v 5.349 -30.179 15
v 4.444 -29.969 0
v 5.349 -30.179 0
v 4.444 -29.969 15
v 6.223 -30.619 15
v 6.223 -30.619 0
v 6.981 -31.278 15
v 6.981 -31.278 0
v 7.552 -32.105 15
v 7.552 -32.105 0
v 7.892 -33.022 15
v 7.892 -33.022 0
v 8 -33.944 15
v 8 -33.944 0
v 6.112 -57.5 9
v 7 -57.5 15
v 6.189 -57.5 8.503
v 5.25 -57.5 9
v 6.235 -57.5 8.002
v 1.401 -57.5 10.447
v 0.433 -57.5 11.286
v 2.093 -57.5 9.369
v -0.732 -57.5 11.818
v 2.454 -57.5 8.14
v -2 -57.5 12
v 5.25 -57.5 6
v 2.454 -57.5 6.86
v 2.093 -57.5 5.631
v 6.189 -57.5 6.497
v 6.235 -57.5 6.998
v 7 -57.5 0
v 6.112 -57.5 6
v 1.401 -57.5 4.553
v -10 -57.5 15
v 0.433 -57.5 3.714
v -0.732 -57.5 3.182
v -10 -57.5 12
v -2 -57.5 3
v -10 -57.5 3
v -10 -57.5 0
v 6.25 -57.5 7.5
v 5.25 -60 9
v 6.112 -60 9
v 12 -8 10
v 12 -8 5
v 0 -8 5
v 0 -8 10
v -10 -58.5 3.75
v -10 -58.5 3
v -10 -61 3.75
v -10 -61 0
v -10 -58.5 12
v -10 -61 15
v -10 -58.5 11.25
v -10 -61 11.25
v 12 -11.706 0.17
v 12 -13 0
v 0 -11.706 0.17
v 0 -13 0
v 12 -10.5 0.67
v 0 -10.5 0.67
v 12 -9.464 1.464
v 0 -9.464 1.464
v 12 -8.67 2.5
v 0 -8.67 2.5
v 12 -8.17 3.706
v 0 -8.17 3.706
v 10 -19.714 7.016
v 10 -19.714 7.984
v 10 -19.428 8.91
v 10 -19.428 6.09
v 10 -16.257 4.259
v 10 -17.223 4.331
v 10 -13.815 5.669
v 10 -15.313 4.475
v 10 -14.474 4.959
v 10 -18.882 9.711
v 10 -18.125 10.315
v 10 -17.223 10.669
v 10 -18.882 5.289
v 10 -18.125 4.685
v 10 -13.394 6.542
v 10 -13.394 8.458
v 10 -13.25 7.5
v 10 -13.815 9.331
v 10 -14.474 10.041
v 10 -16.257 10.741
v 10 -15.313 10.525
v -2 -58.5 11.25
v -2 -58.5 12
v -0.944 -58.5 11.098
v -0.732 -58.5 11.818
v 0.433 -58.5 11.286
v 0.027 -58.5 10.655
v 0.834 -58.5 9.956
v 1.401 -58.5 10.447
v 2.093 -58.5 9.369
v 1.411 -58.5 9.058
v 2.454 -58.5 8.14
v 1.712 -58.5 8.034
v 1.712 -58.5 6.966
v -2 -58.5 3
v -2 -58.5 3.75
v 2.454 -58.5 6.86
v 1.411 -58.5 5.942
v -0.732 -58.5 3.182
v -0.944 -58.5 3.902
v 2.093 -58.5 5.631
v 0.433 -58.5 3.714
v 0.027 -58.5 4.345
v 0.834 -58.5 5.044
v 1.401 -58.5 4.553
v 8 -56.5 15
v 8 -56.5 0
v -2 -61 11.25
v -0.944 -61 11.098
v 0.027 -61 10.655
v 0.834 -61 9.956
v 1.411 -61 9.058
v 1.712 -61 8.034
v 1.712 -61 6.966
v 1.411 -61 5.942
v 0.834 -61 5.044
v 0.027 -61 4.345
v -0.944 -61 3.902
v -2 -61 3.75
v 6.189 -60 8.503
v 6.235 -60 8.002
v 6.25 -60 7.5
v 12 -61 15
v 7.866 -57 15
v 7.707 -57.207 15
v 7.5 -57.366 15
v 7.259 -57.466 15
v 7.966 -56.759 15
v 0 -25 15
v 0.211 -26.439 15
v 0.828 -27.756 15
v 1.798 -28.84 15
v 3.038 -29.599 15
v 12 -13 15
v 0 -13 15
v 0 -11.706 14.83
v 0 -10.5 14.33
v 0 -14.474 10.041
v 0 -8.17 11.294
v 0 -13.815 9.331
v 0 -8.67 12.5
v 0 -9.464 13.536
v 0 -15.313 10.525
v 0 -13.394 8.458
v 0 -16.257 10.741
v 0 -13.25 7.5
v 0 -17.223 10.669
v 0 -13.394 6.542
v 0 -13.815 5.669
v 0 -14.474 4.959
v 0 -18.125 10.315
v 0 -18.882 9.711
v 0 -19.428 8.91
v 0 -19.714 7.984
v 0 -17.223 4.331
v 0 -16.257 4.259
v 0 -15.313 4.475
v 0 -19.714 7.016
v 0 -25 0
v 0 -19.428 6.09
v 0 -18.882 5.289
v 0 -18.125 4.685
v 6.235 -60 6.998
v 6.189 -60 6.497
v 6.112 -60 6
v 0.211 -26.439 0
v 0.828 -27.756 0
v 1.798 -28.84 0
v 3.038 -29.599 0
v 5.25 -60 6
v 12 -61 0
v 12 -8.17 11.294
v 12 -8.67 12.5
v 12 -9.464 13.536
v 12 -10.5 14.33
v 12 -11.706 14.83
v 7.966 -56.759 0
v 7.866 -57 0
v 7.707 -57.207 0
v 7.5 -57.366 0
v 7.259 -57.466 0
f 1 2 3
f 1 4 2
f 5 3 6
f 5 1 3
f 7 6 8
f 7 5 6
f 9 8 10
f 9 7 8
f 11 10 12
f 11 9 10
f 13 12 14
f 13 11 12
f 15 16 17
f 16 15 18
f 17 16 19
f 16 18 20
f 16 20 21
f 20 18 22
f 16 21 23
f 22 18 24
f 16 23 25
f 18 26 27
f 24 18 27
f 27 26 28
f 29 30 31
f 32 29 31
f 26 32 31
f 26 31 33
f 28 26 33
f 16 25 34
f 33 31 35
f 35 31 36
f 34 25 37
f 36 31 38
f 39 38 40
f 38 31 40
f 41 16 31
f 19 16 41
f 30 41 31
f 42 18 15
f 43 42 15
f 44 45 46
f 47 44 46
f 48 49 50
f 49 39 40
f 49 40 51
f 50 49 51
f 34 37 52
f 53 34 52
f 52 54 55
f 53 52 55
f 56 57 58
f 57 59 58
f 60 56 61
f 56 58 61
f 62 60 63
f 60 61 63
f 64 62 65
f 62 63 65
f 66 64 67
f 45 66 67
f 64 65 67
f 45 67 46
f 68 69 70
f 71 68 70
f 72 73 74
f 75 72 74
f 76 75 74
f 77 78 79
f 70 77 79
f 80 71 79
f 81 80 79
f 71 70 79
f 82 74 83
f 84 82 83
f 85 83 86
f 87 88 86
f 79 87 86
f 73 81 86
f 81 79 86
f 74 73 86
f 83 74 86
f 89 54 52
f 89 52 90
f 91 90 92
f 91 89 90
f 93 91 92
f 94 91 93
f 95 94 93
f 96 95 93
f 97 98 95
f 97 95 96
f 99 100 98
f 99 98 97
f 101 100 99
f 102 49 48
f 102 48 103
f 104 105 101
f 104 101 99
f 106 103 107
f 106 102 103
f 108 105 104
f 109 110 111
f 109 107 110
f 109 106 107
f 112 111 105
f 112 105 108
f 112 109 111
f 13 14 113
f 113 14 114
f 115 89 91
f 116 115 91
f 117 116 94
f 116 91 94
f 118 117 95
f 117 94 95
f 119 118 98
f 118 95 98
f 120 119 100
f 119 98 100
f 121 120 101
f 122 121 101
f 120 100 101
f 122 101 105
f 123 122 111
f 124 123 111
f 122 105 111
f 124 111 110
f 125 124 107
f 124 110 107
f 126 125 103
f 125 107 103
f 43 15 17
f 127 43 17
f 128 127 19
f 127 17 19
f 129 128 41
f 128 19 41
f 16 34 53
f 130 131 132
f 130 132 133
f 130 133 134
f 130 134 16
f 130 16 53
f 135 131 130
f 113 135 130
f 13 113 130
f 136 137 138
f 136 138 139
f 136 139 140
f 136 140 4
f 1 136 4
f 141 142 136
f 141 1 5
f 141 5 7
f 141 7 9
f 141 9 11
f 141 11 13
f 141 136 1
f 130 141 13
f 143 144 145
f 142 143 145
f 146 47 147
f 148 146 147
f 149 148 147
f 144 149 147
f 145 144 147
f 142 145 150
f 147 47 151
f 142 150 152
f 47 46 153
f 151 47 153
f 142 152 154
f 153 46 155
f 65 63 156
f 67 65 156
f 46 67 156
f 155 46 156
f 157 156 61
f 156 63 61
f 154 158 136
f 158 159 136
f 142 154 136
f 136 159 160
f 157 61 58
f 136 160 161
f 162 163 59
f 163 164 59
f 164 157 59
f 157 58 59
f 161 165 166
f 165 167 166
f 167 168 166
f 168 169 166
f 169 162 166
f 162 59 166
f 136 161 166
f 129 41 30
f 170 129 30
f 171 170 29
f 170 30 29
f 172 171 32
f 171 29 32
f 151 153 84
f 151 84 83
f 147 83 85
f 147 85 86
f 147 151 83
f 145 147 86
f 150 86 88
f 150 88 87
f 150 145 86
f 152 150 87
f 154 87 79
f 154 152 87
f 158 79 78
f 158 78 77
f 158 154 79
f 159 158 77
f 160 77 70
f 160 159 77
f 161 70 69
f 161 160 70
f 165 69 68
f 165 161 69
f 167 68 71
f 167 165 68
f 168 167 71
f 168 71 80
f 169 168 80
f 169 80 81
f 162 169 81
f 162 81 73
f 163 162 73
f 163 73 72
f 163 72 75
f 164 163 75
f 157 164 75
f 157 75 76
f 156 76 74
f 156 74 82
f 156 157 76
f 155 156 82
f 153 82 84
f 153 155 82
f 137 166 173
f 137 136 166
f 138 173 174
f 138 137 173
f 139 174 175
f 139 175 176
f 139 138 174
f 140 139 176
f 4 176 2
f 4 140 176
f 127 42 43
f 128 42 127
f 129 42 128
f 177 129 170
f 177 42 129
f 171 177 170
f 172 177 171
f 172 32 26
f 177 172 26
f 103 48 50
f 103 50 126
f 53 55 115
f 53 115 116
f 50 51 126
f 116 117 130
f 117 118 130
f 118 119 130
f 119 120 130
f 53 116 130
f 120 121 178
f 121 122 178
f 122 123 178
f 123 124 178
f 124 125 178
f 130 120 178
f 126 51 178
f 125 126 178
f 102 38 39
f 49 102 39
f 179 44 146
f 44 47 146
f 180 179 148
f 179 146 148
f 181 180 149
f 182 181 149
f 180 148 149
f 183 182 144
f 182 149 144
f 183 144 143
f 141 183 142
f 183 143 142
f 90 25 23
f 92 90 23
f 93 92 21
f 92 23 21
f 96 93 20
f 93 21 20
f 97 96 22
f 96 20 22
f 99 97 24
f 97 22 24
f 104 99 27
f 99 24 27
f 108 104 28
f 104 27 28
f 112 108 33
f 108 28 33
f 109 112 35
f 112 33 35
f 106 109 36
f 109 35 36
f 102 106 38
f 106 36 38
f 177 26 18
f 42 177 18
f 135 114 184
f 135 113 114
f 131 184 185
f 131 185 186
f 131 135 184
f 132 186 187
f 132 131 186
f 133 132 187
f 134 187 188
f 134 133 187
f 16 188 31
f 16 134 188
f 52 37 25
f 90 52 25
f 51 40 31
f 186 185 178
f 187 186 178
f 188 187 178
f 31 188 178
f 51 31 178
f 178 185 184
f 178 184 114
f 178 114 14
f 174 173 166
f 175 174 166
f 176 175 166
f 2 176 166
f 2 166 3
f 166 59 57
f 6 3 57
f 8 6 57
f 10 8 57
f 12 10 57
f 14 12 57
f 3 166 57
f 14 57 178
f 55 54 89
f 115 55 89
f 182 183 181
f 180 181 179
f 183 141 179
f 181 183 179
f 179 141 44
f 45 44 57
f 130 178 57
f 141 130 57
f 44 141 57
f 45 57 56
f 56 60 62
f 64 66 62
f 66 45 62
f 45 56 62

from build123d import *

# Parameters (mm, degrees)
BOSS_EXTRUDE1_DEPTH    = 15
CUT_EXTRUDE1_OUTLINE_R = 3.25
CUT_EXTRUDE1_DEPTH     = 10
CUT_EXTRUDE2_DEPTH     = 1
CUT_EXTRUDE3_REACH     = 56.03
SKETCH5_W              = 8
SKETCH5_H              = 7.5
CUT_EXTRUDE4_DEPTH     = 2.5
FILLET1_R              = 5
FILLET2_R              = 4
FILLET4_R              = 5
FILLET5_R              = 1


# Read off the part's stored shape, not the designer's step: Cut-Extrude1
with BuildPart() as part:
    # Sketch1 → Boss-Extrude1 (new body)
    with BuildSketch(Plane.XY):
        Polygon((0, -8), (0, -30), (8, -30), (8, -57.5), (-10, -57.5), (-10, -61), (12, -61), (12, -8), align=None)
    extrude(amount=BOSS_EXTRUDE1_DEPTH)

    # Cut-Extrude1 outline → Cut-Extrude1 (cut)
    with BuildSketch(Plane.YZ):
        with Locations((-16.5, 7.5)):
            Circle(CUT_EXTRUDE1_OUTLINE_R)
    extrude(amount=CUT_EXTRUDE1_DEPTH, mode=Mode.SUBTRACT)

    # Sketch4 → Cut-Extrude2 (cut)
    with BuildSketch(Plane(origin=(0, -57.5, 0), x_dir=(1, 0, 0), z_dir=(0, 1, 0))):
        with BuildLine():
            Line((-2, -3), (-10, -3))
            Line((-10, -3), (-10, -12))
            Line((-10, -12), (-2, -12))
            ThreePointArc((-2, -12), (2.5, -7.5), (-2, -3))
        make_face()
    extrude(amount=-CUT_EXTRUDE2_DEPTH, mode=Mode.SUBTRACT)

    # Sketch5 → Cut-Extrude3 (cut, up to next)
    with BuildSketch(Plane(origin=(0, -58.5, 0), x_dir=(1, 0, 0), z_dir=(0, 1, 0)), mode=Mode.PRIVATE) as cut_extrude3_sk1:
        with BuildLine():
            ThreePointArc((-2, -11.25), (1.75, -7.5), (-2, -3.75))
            Line((-2, -3.75), (-2, -11.25))
        make_face()
    cut_extrude3_tool1 = extrude(cut_extrude3_sk1.sketch, amount=-CUT_EXTRUDE3_REACH, mode=Mode.PRIVATE) & part.part
    # Sketch5 → Cut-Extrude3 (cut, up to next)
    with BuildSketch(Plane(origin=(0, -58.5, 0), x_dir=(1, 0, 0), z_dir=(0, 1, 0)), mode=Mode.PRIVATE) as cut_extrude3_sk2:
        with Locations((-6, -7.5)):
            Rectangle(SKETCH5_W, SKETCH5_H)
    cut_extrude3_tool2 = extrude(cut_extrude3_sk2.sketch, amount=-CUT_EXTRUDE3_REACH, mode=Mode.PRIVATE) & part.part
    add(cut_extrude3_tool1.solids().sort_by_distance((-0.408451, -58.5, 7.5))[0], mode=Mode.SUBTRACT)
    add(cut_extrude3_tool2.solids().sort_by_distance((-6, -58.5, 7.5))[0], mode=Mode.SUBTRACT)

    # Sketch6 → Cut-Extrude4 (cut)
    with BuildSketch(Plane(origin=(0, -57.5, 0), x_dir=(1, 0, 0), z_dir=(0, 1, 0))):
        with BuildLine():
            Line((5.25, -7.5), (6.25, -7.5))
            ThreePointArc((6.25, -7.5), (6.215550668, -6.74685511), (6.11249037, -6))
            Line((6.11249037, -6), (5.25, -6))
            Line((5.25, -6), (5.25, -7.5))
        make_face()
        with BuildLine():
            ThreePointArc((6.11249037, -9), (6.215550668, -8.25314489), (6.25, -7.5))
            Line((6.25, -7.5), (5.25, -7.5))
            Line((5.25, -7.5), (5.25, -9))
            Line((5.25, -9), (6.11249037, -9))
        make_face()
    extrude(amount=-CUT_EXTRUDE4_DEPTH, mode=Mode.SUBTRACT)

    # Fillet1
    fillet1_edges = [part.edges().sort_by_distance(p)[0] for p in [
        (0, -30, 7.5),
    ]]
    fillet(fillet1_edges, radius=FILLET1_R)

    # Fillet2
    fillet2_edges = [part.edges().sort_by_distance(p)[0] for p in [
        (8, -30, 7.5),
    ]]
    fillet(fillet2_edges, radius=FILLET2_R)

    # Fillet4
    fillet4_edges = [part.edges().sort_by_distance(p)[0] for p in [
        (6, -8, 0),
        (6, -8, 15),
    ]]
    fillet(fillet4_edges, radius=FILLET4_R)

    # Fillet5
    fillet5_edges = [part.edges().sort_by_distance(p)[0] for p in [
        (8, -57.5, 7.5),
    ]]
    fillet(fillet5_edges, radius=FILLET5_R)


solid = part.part
